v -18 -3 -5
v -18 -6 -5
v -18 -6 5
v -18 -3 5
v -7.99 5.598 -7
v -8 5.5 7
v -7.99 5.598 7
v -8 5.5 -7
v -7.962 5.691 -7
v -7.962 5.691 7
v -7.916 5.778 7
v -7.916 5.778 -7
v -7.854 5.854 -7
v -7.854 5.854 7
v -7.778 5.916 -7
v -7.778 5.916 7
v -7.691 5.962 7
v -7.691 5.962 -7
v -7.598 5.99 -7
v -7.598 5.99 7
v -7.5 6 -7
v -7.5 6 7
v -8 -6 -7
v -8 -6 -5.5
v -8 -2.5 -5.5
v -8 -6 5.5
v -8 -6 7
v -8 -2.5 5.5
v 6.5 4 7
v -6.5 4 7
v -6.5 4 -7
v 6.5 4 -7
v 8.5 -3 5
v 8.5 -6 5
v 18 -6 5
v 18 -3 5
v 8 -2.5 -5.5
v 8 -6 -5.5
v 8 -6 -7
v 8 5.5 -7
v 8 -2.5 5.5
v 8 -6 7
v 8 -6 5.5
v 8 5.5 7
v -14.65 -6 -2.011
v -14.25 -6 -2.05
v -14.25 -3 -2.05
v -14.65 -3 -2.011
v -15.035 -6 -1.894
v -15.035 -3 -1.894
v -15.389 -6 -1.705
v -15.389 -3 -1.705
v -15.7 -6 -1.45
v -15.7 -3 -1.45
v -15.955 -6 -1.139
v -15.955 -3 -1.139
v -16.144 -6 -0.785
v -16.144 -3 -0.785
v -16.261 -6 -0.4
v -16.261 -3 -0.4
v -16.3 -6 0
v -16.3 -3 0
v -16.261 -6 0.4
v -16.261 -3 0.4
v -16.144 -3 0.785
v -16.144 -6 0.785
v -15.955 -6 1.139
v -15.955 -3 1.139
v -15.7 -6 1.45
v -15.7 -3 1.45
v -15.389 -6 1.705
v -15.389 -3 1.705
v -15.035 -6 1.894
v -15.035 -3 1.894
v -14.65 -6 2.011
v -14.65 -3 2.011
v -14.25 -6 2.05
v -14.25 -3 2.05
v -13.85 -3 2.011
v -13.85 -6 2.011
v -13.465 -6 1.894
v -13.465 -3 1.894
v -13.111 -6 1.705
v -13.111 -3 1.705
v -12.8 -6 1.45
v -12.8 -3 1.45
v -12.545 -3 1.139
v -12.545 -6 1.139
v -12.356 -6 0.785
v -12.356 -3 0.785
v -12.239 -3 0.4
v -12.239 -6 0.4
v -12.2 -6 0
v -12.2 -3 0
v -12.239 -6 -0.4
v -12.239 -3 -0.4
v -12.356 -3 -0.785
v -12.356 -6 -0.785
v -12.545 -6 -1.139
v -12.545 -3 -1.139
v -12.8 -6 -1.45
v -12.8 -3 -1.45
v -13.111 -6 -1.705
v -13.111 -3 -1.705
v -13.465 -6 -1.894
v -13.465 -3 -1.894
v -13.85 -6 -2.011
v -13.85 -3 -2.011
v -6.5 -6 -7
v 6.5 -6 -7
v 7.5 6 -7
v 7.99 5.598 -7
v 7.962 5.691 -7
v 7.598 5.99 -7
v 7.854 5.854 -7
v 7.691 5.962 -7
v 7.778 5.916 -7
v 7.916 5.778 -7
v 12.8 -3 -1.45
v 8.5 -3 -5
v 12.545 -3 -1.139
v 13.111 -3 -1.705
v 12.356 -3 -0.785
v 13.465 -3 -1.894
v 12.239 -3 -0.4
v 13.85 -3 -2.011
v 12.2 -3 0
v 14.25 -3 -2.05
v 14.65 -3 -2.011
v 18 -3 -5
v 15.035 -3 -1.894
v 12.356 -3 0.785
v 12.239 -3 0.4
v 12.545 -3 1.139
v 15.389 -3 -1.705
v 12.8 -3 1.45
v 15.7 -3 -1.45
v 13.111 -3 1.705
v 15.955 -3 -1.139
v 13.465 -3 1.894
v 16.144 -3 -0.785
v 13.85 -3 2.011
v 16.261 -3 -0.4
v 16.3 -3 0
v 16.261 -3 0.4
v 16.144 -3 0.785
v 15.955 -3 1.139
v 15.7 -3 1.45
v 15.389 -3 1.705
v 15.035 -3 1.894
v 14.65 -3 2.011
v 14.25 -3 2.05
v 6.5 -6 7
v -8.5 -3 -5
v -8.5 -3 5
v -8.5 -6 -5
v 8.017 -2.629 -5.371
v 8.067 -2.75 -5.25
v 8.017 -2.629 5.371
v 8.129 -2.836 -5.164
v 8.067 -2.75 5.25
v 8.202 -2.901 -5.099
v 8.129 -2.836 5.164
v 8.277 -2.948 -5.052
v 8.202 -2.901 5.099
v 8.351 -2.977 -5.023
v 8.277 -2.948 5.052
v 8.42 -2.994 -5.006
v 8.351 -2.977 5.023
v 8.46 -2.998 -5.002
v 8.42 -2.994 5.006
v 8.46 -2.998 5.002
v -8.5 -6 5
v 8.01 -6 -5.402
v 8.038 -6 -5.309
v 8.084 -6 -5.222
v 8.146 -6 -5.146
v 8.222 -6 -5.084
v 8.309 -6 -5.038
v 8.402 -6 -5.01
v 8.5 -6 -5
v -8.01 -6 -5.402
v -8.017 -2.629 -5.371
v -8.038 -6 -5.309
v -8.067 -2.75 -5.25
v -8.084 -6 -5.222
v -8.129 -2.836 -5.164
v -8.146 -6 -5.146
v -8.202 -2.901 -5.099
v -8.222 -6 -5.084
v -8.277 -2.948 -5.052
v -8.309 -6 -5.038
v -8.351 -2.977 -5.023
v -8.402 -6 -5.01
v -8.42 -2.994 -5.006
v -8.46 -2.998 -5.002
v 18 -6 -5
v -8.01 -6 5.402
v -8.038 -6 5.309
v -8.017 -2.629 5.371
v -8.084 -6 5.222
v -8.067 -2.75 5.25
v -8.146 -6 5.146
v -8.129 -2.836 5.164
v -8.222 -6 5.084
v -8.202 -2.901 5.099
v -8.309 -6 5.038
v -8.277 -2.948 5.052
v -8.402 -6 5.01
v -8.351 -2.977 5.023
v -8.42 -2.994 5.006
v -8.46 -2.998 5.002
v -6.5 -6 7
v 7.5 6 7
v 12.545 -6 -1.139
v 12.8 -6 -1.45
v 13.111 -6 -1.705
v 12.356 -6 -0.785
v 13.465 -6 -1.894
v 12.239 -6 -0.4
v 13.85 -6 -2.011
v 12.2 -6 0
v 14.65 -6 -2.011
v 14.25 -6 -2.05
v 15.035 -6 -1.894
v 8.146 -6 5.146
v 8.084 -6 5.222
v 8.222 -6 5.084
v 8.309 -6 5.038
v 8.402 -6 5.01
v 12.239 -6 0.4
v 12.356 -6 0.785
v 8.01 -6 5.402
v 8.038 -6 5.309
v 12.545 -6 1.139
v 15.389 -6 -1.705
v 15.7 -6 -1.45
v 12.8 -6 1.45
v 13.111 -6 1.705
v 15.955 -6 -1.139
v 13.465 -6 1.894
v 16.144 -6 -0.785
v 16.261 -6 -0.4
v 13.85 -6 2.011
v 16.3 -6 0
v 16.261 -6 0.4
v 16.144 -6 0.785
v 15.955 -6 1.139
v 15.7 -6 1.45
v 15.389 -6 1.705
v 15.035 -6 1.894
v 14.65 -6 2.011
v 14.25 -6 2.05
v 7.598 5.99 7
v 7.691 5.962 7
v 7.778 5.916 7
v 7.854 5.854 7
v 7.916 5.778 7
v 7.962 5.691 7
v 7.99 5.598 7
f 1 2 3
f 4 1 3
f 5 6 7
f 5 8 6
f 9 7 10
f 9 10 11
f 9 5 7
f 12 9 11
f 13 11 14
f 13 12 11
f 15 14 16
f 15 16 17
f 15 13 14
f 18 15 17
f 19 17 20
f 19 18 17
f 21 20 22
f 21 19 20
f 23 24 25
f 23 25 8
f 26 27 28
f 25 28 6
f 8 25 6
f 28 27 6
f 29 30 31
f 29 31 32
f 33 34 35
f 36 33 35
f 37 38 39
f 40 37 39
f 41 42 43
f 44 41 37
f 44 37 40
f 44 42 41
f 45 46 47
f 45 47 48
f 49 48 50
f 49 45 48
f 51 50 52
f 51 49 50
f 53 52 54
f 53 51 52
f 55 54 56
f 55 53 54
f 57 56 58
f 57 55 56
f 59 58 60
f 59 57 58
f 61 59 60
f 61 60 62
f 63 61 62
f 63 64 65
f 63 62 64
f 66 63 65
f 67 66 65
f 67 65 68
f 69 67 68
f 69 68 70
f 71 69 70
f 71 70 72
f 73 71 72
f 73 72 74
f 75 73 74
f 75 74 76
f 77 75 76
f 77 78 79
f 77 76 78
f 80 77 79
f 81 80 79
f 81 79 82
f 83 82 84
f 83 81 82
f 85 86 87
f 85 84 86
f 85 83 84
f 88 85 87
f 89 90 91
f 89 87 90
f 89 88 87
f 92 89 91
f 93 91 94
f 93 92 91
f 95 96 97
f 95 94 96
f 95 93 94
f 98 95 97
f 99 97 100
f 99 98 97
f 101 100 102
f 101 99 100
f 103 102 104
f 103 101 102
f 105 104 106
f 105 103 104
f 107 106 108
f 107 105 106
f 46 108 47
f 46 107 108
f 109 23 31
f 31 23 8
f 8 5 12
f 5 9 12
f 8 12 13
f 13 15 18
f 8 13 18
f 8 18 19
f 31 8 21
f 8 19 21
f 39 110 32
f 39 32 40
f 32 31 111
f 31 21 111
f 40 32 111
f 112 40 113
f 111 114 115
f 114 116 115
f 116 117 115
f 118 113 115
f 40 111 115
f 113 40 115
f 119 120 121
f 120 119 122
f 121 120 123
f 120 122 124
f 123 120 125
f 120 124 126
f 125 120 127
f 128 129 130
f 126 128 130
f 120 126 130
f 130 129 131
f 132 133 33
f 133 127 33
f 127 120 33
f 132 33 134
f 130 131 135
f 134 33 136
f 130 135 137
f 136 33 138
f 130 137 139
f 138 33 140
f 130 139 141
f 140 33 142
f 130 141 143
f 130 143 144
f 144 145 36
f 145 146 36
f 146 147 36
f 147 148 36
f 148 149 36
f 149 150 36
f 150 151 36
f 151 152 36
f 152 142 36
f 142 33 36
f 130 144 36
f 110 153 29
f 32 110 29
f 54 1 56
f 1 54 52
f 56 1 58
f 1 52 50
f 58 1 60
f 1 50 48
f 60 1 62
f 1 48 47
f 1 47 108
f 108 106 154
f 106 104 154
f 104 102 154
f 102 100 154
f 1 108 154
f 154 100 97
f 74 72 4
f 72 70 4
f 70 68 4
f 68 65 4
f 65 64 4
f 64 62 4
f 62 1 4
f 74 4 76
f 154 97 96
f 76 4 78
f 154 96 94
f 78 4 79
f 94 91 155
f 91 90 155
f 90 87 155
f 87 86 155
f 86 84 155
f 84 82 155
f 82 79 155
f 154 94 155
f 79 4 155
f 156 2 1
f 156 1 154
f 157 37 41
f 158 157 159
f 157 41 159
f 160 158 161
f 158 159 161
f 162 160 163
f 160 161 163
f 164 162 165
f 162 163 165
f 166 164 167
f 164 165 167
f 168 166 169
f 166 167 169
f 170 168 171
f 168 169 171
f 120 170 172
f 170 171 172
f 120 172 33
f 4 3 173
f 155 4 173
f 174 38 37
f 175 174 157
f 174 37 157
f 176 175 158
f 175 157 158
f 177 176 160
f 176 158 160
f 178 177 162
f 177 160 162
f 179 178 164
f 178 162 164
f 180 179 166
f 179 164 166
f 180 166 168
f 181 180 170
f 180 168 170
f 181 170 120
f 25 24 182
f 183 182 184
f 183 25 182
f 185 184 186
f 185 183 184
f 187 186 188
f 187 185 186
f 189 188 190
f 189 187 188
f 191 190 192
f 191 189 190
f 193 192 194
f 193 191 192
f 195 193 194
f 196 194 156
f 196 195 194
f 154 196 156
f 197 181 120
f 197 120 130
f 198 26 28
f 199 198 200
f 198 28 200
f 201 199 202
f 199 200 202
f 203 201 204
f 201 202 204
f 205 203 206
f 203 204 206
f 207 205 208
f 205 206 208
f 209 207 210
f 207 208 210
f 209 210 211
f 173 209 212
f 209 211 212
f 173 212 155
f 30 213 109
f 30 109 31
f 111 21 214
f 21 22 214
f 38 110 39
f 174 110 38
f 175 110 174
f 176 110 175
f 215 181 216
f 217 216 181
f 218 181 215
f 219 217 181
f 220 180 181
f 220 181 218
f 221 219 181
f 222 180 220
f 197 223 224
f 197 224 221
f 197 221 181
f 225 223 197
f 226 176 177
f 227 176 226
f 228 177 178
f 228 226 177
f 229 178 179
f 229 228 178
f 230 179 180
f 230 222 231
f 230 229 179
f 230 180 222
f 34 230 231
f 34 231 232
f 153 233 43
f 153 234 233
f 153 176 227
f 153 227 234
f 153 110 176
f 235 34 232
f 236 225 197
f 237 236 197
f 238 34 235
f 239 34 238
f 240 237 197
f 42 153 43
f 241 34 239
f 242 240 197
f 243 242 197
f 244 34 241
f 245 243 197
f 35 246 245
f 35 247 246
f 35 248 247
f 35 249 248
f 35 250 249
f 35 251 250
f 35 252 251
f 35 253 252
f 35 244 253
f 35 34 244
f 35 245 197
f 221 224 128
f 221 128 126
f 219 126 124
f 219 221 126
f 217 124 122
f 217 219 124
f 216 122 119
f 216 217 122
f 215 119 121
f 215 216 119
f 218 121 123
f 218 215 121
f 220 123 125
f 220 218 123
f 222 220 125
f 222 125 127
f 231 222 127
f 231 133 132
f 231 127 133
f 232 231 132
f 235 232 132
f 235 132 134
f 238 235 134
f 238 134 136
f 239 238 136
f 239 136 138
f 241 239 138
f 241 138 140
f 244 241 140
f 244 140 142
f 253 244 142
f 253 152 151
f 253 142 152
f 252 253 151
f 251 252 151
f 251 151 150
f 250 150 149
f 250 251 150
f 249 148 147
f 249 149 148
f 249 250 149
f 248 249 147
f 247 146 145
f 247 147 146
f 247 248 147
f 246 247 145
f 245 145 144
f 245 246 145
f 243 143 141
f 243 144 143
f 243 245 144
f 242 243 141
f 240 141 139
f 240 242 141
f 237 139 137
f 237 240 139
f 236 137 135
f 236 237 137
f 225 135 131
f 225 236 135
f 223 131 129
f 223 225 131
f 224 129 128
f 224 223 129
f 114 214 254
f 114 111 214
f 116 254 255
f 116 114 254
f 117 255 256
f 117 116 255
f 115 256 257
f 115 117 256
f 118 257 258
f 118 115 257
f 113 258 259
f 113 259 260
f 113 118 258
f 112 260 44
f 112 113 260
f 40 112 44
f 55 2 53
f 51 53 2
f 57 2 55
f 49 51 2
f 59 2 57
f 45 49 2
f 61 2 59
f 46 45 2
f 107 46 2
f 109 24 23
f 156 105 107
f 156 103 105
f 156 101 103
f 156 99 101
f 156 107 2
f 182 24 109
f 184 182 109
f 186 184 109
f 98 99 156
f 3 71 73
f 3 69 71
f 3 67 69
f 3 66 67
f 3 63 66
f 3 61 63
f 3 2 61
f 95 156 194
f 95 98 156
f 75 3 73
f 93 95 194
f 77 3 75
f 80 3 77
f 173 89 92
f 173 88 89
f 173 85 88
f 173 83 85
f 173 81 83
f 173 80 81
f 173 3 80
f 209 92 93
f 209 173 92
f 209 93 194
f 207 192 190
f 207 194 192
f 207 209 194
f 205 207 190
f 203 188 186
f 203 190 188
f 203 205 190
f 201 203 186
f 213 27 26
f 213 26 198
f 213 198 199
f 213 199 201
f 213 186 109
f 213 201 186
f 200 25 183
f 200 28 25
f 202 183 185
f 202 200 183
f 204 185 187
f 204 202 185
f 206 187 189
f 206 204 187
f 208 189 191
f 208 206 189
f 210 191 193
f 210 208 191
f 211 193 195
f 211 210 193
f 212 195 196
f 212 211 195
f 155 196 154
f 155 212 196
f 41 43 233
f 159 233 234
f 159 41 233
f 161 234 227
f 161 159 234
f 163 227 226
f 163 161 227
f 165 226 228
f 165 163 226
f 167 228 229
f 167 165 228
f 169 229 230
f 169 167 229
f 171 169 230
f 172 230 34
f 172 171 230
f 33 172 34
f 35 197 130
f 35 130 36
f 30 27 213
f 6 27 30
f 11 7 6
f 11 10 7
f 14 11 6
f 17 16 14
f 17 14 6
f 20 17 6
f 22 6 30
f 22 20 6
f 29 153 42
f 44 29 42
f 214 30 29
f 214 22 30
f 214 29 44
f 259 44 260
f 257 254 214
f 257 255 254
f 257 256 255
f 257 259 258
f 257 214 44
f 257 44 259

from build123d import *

# Parameters (mm, degrees)
SKETCH1_W               = 16
SKETCH1_H               = 12
BOSS_EXTRUDE1_DEPTH     = 7
SKETCH2_W               = 13
SKETCH2_H               = 10
CUT_EXTRUDE1_DEPTH      = 18.204650534
SKETCH6_W               = 10
SKETCH6_H               = 10
BOSS_EXTRUDE2_DEPTH     = 3
FILLET1_R               = 0.5
CUT_EXTRUDE2_DEPTH      = 22.307275753
CUT_EXTRUDE2_DEPTH_BACK = 10
SKETCH9_R               = 2.05


with BuildPart() as part:
    # Sketch1 → Boss-Extrude1 (new, symmetric)
    with BuildSketch(Plane.XY):
        Rectangle(SKETCH1_W, SKETCH1_H)
    extrude(amount=BOSS_EXTRUDE1_DEPTH, both=True)

    # Sketch2 → Cut-Extrude1 (cut, through all)
    with BuildSketch(Plane.XY.offset(7)):
        with Locations((0, -1)):
            Rectangle(SKETCH2_W, SKETCH2_H)
    extrude(amount=-CUT_EXTRUDE1_DEPTH, mode=Mode.SUBTRACT)

    # Sketch6 → Boss-Extrude2 (add)
    with BuildSketch(Plane.XZ.offset(6)):
        with Locations((-13, 0)):
            Rectangle(SKETCH6_W, SKETCH6_H)
        with Locations((13, 0)):
            Rectangle(SKETCH6_W, SKETCH6_H)
    extrude(amount=-BOSS_EXTRUDE2_DEPTH)

    # Fillet1
    fillet1_edges = [part.edges().sort_by_distance(p)[0] for p in [
        (8, 6, 0),
        (-8, 6, 0),
        (-8, -3, 0),
        (8, -3, 0),
        (8, -4.5, 5),
        (8, -4.5, -5),
        (-8, -4.5, -5),
        (-8, -4.5, 5),
    ]]
    fillet(fillet1_edges, radius=FILLET1_R)

    # Sketch9 → Cut-Extrude2 (cut, two sides: drawn at the far end of the back side and taken through both)
    with BuildSketch(Plane(origin=(0, -3, 0), x_dir=(1, 0, 0), z_dir=(0, 1, 0)).offset(-CUT_EXTRUDE2_DEPTH_BACK)):
        with Locations((-14.25, 0)):
            Circle(SKETCH9_R)
        with Locations((14.25, 0)):
            Circle(SKETCH9_R)
    extrude(amount=CUT_EXTRUDE2_DEPTH + CUT_EXTRUDE2_DEPTH_BACK, mode=Mode.SUBTRACT)


solid = part.part
